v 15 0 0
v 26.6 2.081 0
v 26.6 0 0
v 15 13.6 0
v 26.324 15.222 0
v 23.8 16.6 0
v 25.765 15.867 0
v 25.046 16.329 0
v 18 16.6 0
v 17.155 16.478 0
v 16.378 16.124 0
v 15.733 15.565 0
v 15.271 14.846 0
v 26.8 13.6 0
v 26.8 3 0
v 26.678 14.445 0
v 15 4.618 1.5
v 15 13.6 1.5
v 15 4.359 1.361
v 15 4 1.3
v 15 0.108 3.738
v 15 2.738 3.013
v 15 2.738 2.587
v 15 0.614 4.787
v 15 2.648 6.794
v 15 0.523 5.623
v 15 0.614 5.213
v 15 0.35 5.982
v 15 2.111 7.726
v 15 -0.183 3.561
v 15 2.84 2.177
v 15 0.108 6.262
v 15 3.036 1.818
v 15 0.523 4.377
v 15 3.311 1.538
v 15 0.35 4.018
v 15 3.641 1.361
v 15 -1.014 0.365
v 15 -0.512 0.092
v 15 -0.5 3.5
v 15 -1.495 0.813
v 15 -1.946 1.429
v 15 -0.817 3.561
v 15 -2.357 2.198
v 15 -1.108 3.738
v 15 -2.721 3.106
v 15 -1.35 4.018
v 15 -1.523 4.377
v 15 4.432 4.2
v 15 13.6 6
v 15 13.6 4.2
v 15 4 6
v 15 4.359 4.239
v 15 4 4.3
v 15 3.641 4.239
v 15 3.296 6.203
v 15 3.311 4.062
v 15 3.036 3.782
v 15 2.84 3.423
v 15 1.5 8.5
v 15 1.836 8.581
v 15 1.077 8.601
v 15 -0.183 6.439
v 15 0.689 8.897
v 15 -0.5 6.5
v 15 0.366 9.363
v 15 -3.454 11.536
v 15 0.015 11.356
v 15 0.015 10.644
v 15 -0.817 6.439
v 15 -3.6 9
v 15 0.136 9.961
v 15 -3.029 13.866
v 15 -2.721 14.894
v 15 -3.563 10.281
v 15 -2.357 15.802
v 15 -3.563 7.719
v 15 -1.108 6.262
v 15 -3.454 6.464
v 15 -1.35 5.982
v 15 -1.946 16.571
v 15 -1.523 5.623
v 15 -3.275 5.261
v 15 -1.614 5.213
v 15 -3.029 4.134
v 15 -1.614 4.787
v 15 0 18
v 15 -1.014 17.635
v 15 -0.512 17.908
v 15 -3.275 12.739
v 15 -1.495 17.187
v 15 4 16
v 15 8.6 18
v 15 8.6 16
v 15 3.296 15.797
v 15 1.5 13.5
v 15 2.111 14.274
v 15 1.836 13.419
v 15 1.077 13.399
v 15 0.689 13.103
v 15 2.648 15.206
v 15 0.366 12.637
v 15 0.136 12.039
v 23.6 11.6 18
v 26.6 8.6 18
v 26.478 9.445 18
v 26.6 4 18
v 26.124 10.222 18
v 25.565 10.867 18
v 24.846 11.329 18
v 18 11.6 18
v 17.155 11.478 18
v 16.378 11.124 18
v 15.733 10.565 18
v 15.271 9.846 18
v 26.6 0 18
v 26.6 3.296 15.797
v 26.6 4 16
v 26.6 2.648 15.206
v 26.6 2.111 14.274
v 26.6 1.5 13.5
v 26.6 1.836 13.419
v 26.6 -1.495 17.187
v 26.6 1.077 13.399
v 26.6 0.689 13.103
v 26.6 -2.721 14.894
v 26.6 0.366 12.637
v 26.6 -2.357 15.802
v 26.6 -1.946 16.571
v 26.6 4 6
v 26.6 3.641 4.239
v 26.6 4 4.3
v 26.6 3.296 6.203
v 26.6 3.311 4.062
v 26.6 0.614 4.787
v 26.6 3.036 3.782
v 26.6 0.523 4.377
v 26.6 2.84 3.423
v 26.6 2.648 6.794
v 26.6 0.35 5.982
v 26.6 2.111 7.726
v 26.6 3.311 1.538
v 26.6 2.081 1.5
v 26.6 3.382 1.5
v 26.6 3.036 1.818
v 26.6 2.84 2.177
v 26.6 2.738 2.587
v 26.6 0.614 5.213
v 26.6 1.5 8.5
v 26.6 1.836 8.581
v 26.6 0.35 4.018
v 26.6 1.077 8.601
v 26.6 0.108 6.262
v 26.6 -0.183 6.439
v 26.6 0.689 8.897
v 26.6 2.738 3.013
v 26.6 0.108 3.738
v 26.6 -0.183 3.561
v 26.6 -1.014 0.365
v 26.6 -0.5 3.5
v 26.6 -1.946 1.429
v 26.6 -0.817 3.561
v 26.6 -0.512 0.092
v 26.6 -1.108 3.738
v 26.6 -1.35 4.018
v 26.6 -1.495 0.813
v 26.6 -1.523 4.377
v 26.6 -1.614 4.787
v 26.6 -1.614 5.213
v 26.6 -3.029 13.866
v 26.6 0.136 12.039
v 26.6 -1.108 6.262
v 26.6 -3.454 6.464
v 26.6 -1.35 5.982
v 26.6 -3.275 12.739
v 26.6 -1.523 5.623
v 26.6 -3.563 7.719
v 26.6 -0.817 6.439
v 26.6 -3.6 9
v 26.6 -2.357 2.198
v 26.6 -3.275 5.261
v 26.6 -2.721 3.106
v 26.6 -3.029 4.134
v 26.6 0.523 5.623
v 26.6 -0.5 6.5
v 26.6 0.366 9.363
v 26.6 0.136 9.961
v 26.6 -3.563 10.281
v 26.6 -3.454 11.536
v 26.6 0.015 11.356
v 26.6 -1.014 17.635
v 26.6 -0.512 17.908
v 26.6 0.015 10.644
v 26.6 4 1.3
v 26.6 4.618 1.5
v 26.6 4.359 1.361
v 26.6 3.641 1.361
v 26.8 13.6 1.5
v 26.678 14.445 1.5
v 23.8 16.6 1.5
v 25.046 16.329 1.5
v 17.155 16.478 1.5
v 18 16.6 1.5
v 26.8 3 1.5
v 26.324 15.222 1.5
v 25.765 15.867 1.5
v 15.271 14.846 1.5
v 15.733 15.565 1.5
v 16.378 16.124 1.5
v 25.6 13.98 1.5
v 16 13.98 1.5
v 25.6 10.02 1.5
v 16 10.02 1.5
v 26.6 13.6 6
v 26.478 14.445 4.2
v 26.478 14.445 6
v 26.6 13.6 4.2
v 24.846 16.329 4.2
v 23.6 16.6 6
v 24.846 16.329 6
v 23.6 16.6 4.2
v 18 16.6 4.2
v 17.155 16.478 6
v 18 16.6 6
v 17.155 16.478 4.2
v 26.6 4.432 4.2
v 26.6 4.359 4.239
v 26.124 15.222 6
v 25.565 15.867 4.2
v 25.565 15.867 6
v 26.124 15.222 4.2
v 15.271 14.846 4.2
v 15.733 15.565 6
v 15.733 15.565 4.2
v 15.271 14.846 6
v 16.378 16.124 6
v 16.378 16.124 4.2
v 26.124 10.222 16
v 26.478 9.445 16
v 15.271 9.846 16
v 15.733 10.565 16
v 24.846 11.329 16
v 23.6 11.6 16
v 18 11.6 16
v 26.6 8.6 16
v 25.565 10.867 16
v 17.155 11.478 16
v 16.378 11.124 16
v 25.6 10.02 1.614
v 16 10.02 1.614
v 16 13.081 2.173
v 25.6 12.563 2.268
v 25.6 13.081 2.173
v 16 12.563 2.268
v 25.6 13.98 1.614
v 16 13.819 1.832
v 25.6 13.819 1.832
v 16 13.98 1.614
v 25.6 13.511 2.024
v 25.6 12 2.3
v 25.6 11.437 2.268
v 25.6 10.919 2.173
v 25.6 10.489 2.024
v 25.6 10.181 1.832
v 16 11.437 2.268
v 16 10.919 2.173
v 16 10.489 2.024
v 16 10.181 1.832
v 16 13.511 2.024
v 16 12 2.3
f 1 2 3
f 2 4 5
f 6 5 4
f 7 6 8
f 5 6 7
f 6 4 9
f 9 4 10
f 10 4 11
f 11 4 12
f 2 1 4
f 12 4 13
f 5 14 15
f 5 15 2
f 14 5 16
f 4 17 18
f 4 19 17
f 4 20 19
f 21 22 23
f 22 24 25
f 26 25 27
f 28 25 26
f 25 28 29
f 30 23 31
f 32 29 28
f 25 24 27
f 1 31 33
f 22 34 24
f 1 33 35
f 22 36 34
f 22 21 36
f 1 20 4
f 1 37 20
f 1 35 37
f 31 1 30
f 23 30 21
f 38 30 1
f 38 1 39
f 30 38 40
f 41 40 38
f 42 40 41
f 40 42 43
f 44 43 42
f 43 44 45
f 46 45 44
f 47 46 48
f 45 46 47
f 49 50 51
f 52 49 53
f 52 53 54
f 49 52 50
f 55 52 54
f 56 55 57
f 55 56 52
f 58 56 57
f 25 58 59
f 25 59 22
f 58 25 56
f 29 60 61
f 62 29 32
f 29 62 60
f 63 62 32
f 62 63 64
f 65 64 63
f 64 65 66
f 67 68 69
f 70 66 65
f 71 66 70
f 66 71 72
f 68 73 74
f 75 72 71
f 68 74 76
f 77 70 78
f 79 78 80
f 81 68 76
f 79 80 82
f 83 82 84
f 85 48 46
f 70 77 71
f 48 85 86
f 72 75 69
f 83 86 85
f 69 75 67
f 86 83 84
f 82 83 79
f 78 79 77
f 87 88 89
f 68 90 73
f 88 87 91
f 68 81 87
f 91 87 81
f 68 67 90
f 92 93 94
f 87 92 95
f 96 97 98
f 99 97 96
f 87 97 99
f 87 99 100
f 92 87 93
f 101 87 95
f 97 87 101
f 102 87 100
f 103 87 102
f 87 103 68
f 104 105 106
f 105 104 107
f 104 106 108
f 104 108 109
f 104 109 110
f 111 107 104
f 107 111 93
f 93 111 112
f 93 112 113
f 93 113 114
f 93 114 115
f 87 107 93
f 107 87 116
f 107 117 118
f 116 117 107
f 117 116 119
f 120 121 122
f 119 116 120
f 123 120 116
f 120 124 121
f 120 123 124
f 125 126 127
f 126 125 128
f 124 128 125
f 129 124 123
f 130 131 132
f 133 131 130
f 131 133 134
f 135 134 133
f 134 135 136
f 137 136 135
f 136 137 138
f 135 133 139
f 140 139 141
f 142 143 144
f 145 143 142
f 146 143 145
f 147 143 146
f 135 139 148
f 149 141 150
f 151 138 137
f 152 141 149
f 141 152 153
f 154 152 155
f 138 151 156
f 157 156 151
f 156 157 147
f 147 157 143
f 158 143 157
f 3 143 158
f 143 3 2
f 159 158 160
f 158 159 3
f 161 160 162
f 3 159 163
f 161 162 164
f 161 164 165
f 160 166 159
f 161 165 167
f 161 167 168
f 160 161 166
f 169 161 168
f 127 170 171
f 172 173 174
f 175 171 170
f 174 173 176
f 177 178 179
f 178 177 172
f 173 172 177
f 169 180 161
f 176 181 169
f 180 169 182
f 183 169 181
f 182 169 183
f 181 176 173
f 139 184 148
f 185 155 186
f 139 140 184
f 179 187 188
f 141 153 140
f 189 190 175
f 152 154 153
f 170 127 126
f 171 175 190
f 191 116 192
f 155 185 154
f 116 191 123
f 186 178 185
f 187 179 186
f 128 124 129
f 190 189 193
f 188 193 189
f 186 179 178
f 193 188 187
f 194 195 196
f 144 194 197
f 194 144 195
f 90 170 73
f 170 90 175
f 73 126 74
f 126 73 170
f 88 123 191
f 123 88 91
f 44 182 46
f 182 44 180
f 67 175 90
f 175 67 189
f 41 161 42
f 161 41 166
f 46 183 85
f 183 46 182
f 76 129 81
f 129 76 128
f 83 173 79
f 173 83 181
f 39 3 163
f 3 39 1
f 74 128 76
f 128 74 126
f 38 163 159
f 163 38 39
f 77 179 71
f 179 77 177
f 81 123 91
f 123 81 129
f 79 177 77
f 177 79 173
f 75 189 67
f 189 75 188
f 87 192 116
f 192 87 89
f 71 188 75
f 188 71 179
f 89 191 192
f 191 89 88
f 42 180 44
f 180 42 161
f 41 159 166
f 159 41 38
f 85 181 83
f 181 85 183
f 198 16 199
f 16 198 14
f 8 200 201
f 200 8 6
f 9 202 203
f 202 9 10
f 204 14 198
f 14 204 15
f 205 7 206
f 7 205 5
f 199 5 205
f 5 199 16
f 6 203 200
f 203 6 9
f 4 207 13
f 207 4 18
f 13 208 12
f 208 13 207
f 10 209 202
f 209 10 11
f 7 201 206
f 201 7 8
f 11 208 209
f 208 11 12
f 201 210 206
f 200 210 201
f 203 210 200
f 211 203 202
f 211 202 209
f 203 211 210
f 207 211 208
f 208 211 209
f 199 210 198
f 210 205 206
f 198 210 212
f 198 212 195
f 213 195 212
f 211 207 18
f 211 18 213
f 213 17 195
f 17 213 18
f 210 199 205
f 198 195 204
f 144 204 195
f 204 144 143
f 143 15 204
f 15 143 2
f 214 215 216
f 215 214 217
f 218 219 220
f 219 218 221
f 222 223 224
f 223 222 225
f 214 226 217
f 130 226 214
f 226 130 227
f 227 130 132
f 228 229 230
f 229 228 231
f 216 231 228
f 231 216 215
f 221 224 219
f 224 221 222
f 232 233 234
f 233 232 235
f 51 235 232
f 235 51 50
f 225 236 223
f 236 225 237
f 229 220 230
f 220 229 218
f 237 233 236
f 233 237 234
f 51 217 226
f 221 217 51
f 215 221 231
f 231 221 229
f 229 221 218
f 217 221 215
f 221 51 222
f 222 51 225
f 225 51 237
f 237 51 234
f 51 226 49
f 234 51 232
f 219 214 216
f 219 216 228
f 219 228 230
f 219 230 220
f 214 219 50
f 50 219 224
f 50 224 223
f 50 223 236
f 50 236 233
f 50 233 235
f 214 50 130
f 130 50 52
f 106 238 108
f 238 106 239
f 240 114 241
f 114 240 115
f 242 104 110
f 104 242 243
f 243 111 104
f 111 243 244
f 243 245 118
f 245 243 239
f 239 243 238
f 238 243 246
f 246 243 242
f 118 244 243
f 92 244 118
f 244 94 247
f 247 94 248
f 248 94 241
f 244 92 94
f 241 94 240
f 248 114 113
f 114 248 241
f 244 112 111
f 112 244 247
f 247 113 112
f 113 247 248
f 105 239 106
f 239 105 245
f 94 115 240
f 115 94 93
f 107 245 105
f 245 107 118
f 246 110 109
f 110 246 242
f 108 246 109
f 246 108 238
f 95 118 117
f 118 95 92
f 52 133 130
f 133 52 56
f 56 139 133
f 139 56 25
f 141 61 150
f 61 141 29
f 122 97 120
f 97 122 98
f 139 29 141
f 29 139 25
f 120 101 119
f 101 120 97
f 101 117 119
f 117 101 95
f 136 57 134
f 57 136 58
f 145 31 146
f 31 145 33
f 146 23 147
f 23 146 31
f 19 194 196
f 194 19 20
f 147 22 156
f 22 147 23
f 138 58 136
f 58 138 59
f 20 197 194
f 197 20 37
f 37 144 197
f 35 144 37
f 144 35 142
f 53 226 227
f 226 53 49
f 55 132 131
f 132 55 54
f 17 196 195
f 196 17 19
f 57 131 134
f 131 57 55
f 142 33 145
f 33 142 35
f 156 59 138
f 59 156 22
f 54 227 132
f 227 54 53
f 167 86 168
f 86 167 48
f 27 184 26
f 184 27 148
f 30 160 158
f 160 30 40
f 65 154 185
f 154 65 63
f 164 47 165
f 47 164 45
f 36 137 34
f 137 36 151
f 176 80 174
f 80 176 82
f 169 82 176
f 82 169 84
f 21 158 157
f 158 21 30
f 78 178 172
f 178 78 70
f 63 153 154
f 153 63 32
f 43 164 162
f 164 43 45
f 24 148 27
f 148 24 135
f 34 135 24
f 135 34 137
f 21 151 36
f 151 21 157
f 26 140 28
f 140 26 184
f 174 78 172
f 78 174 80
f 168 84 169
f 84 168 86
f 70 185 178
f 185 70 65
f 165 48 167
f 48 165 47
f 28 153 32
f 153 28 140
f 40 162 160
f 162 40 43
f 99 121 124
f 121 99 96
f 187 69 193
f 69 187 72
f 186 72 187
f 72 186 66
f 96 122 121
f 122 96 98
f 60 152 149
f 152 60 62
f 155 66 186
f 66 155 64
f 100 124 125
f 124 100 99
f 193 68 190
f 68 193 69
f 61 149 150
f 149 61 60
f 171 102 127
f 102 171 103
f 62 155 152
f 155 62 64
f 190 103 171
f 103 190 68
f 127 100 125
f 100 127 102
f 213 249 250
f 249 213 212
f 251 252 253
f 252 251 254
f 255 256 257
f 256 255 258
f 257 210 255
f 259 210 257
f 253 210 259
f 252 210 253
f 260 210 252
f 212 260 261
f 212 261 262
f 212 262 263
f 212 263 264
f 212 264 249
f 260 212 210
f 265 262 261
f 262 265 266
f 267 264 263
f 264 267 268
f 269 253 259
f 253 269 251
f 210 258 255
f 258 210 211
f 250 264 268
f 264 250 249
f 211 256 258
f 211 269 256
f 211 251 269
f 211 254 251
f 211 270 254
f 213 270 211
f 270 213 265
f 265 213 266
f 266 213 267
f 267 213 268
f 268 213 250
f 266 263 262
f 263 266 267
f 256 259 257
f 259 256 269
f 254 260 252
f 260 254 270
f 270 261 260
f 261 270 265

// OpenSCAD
// Phone1
// Holder for Nexus 5x in the car
// Old plastic is 75 x 150 x n10 mm high

//-------------------------
module clip1(
    Chi = 18,
    Cwide=12,
    Cthick=2,
    Cdeep=15,
    Cround=3){

    linear_extrude(height=Chi)
    square([Cwide,1.5*Cthick]); 
    
/*    translate([0,0.75*Cthick,0])
    cylinder(r=0.75*Cthick,h=Chi,$fn=22);
        
    translate([Cwide,0.75*Cthick,0])
    cylinder(r=0.75*Cthick,h=Chi,$fn=22);
*/
    color("green")
    linear_extrude(height=Cthick)
    translate([Cround,Cround,0])
    offset(r=Cround,$fn=22)
    square([Cwide-2*Cround,Cdeep-2*Cround]);  

    color("red")
    translate([0,0,4])
    linear_extrude(height=Cthick)
    translate([Cround,Cround,0])
    offset(r=Cround,$fn=22)
    square([Cwide-2*Cround,Cdeep-2*Cround]);  
      
    color("cyan")
    translate([0,0,Chi-Cthick])
    linear_extrude(height=Cthick)
    translate([Cround,Cround,0])
    offset(r=Cround,$fn=22)
    square([Cwide-2*Cround,Cdeep-2*Cround-5]);  
}

//-------------------------
module clip2(
    Chi = 18,
    Cwide=12,
    Cthick=2,
    Cdeep=16.6,
    Cround=3){

    difference(){   // diff1
    union(){
    linear_extrude(height=Chi)
    square([Cwide-0.4,2*Cthick]); 
    
    color("orange")
    translate([0,0,9])
    scale([1,0.4,1])
    rotate([0,90,0])
    cylinder(r=9,h=Cwide-0.4,$fn=44);
    
    color("green")
    linear_extrude(height=Cthick-0.5)
    translate([Cround,Cround,0])
    offset(r=Cround,$fn=22)
    square([Cwide-2*Cround-0.2,Cdeep-2*Cround]);  

    color("red")
    translate([0,0,4.2])
    linear_extrude(height=Cthick-0.2)
    translate([Cround,Cround,0])
    offset(r=Cround,$fn=22)
    square([Cwide-2*Cround-0.4,Cdeep-2*Cround]);  
      
    color("cyan")
    translate([0,0,Chi-Cthick])
    linear_extrude(height=Cthick)
    translate([Cround,Cround,0])
    offset(r=Cround,$fn=22)
    square([Cwide-2*Cround-0.4,Cdeep-2*Cround-5]);  
}   // end of union

    color("pink")
    translate([0,4,11])
    scale([1,0.5,1])
    rotate([0,90,0])
    cylinder(r=5,h=Cwide-0.4,$fn=22);
    
    color("cyan")
    translate([0,4,2.8])
    scale([1,0.85,1])
    rotate([0,90,0])
    cylinder(r=1.5,h=Cwide-0.4,$fn=22);

    color("cyan")
    translate([0,-0.5,5])
    scale([1,0.75,1])
    rotate([0,90,0])
    cylinder(r=1.5,h=Cwide-0.4,$fn=22);

    // CHOOSE ONE:
    // regular cut
/*    
    color("cyan")
    translate([0,-1,11])
    scale([1,0.4,1])
    rotate([0,90,0])
    cylinder(r=2,h=Cwide-0.4,$fn=22);
*/    
    
    // special cut for buttons
    color("cyan")
    translate([0,1.5,11])
    scale([1,0.6,1])
    rotate([0,90,0])
    cylinder(r=2.5,h=Cwide-0.4,$fn=22);

    //  END CHOOSE
}   // end of diff1

    color("cyan")
    translate([1,12,1.5])
    scale([1,1,0.4])
    rotate([0,90,0])
    cylinder(r=2,h=Cwide-0.4-2,$fn=22);

}
//--------------------------
// Base
module base1(
    Bhi = 150,
    Bwide = 75,
    Bround=5,
    Bthick=4
){

    translate([Bround,Bround,2]) 
    linear_extrude(height=Bthick)
    offset(r=Bround,$fn=44)
    square(size=[Bwide-2*Bround,Bhi-2*Bround]);

}

//--------------------------
// Hinge
module hinge1(
){
    translate([2,0,0])
    difference(){
    
    linear_extrude(height=3)
    offset(r=2,$fn=22)
    translate([0,2,0])
    square([51,7-2]);
    
    linear_extrude(height=1.25)
    square([51,7]);
    }
    
    translate([25.5,2.5,-4])
    cylinder(r1=2.4,r2=2.6,h=6,$fn=22);
    translate([25.5-18.5,2.5,-4])
    cylinder(r1=2.4,r2=2.6,h=6,$fn=22);
    translate([25.5+18.5,2.5,-4])
    cylinder(r1=2.4,r2=2.6,h=6,$fn=22);
        
    
}

//--------------------------
// Hinge
module hinge2(
){
    translate([2,0,0])
    difference(){
    
    linear_extrude(height=3)
    offset(r=2,$fn=22)
    translate([0,2,0])
    square([44,7-2]);
    
    translate([-2,0,0])
    linear_extrude(height=1.25)
    offset(r=0.5,$fn=12)
    square([51,7]);
    }
    
    translate([25.5-2,2.5,-4])
    cylinder(r1=2.2,r2=2.6,h=6,$fn=22);
    translate([25.5-18.5-2,2.5,-4])
    cylinder(r1=2.2,r2=2.6,h=6,$fn=22);
    translate([25.5+18.5-2,2.5,-4])
    cylinder(r1=2.2,r2=2.6,h=6,$fn=22);
        
    
}


//===========================
/*

difference(){
base1();

color("red")
translate([15,0,0]) clip1();

color("pink")
translate([75-10-15,0,0]) clip1();


color("cyan")
translate([75,15,0]) 
rotate([0,0,90])clip1();

color("orange")
translate([0,15+10,0]) 
rotate([0,0,-90])clip1();

color("cyan")
translate([75,130,0]) 
rotate([0,0,90])clip1();

color("orange")
translate([0,130+10,0]) 
rotate([0,0,-90])clip1();

color("green")
translate([75/2,105,0]) 
cylinder(r1=14,r2=10,h=7);

translate([63,122,2])
rotate([0,180,0])
hinge1();


}

*/

// hinge1();
//color("orange") clip1();

//hinge2();
translate([15,0,0]) clip2();

//===========================
